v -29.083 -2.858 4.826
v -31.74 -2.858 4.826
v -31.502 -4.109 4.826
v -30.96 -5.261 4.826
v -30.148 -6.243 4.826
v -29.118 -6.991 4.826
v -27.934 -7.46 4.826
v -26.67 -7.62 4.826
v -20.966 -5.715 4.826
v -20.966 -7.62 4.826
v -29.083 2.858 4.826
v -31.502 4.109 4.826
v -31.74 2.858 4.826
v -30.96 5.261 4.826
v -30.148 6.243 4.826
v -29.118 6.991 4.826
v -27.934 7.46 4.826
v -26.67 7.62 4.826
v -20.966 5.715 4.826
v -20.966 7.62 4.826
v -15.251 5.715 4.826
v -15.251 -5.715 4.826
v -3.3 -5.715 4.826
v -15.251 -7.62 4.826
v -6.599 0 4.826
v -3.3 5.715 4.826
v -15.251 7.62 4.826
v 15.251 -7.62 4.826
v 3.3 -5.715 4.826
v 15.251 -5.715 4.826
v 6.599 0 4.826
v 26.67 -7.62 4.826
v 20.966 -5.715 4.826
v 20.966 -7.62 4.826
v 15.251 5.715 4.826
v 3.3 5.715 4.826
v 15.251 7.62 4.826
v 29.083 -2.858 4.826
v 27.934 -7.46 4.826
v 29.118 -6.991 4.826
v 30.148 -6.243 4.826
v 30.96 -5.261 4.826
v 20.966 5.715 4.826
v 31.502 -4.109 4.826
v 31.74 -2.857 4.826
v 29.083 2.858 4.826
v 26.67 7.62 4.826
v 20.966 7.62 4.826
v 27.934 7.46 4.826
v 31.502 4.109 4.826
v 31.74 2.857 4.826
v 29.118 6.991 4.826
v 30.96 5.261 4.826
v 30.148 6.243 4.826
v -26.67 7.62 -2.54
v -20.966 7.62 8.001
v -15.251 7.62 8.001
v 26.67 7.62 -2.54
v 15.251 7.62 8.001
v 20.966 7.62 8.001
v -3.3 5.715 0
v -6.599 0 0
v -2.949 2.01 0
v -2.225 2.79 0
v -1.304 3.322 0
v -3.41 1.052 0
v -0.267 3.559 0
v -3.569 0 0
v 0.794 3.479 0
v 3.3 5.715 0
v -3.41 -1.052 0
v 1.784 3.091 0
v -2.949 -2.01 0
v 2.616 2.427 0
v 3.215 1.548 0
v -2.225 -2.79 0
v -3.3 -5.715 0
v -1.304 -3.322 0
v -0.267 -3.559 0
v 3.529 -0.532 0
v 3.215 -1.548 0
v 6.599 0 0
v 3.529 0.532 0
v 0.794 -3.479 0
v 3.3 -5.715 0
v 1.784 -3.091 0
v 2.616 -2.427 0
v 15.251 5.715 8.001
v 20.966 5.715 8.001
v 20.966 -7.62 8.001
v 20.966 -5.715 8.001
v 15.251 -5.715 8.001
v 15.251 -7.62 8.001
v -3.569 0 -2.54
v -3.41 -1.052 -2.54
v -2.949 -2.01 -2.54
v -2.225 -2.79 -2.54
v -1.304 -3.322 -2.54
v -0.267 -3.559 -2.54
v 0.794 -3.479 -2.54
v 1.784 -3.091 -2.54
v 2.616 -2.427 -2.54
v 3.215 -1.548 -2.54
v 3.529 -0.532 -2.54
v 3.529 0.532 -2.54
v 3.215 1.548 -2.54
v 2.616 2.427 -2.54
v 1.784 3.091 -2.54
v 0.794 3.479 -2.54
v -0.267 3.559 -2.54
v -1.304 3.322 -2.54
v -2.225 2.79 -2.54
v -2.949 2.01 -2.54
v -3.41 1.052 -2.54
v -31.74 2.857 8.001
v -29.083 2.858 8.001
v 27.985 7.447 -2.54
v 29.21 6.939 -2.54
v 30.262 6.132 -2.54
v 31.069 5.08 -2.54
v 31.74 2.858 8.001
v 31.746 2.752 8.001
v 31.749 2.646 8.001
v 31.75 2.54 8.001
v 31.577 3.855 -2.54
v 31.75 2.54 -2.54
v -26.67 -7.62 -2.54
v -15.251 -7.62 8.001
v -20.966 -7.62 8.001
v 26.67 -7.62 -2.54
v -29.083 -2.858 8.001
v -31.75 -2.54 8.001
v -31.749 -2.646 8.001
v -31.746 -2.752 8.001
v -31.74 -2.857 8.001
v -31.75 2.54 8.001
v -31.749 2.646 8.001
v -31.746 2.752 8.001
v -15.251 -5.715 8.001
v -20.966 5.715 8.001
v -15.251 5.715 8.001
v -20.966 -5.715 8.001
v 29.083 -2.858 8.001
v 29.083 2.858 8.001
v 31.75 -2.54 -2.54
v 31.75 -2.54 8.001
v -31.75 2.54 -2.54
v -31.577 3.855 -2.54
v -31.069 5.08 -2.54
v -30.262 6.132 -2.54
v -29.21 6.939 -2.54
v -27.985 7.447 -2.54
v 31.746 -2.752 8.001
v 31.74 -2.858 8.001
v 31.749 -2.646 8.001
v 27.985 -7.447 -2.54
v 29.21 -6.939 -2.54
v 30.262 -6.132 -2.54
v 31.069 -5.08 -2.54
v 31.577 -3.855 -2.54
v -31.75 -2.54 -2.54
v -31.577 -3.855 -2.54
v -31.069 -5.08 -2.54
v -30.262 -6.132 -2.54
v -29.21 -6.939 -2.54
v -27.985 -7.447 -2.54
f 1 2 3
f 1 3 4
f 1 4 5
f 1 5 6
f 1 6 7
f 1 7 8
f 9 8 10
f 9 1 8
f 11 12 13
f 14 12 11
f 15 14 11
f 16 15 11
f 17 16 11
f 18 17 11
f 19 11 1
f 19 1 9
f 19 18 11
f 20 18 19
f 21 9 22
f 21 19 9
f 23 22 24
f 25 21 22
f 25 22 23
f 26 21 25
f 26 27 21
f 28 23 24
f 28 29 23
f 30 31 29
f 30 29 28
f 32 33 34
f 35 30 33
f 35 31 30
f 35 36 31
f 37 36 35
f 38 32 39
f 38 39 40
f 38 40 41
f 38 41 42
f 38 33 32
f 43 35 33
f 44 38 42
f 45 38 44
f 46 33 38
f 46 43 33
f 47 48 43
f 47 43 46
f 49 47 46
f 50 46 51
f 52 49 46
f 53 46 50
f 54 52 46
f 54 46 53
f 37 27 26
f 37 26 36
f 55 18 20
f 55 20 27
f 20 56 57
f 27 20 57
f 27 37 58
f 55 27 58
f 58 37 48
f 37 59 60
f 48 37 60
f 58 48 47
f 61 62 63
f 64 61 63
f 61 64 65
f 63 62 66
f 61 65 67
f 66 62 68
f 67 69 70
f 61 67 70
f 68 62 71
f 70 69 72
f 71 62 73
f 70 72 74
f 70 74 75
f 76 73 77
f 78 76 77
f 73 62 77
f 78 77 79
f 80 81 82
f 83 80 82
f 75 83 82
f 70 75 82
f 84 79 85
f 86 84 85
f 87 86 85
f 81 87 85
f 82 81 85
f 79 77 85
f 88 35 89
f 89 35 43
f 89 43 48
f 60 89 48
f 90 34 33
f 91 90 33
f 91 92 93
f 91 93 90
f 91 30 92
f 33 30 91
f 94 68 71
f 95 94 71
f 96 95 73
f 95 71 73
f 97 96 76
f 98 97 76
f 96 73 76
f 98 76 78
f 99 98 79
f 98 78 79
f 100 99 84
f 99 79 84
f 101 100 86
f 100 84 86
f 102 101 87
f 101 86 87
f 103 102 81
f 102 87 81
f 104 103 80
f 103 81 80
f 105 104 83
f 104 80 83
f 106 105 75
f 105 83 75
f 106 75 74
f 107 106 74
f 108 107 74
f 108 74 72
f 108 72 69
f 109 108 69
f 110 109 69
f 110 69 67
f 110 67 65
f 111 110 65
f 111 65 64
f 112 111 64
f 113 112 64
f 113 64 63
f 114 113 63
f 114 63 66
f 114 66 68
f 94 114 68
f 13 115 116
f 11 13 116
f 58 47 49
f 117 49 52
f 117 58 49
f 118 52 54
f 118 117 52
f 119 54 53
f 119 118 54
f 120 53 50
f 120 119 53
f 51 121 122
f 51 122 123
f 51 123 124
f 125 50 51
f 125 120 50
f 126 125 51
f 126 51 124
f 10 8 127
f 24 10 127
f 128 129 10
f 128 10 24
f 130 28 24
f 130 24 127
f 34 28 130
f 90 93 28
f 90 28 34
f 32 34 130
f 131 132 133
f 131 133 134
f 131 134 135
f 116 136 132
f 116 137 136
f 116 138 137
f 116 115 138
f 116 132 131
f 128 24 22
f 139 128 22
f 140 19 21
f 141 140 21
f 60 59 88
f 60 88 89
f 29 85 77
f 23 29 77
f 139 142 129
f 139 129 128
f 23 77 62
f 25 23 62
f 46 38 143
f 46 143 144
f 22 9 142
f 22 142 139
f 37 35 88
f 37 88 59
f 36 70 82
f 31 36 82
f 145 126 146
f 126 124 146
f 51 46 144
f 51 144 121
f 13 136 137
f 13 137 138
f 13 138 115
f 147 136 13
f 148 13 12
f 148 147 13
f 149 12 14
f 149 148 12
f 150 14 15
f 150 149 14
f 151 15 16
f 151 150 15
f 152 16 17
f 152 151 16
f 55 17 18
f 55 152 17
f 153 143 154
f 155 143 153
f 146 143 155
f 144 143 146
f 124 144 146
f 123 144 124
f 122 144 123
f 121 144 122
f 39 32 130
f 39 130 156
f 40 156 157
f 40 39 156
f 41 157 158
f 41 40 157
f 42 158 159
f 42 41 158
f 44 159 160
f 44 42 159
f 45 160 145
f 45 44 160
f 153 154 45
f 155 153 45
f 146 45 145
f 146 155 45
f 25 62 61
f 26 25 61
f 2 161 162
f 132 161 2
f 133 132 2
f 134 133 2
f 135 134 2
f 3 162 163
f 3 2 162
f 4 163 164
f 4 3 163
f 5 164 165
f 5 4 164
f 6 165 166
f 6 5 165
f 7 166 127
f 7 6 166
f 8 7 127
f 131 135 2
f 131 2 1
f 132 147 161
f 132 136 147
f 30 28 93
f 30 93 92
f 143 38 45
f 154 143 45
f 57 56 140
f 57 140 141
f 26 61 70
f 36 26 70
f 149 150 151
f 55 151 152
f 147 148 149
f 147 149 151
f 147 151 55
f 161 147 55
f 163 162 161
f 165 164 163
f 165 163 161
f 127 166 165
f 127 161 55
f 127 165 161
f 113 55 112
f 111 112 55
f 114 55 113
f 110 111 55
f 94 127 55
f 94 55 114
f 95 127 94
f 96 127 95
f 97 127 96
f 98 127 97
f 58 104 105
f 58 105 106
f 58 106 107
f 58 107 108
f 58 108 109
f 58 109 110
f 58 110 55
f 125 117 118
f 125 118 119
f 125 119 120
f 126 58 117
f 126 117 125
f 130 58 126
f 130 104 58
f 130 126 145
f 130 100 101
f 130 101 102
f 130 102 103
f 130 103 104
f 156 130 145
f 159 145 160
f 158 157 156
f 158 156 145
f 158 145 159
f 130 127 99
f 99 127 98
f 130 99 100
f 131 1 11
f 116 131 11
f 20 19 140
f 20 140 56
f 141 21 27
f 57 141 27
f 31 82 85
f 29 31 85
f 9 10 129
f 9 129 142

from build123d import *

# Parameters (mm, degrees)
F0_W     = 63.5
F0_H     = 15.24
F1_DEPTH = 4.826
F2_W     = 2.667
F2_H     = 5.715
F2_W_2   = 5.715
F2_H_2   = 1.905
F3_DEPTH = 3.175
F4_W     = 63.5
F4_H     = 15.24
F5_DEPTH = 2.54
F7_D     = 7.1374
F8_R     = 5.08


with BuildPart() as f1:
    # F0 (on Top) → F1 (new body)
    with BuildSketch(Plane.XY):
        Rectangle(F0_W, F0_H)
        Polygon((-3.2995567884, -5.715), (-6.5991135768, 0), (-3.2995567884, 5.715), (3.2995567884, 5.715), (6.5991135768, 0), (3.2995567884, -5.715), align=None, mode=Mode.SUBTRACT)
    extrude(amount=F1_DEPTH)

    # F2 (on face) → F3 (join)
    with BuildSketch(Plane.XY.offset(4.826)):
        with Locations((-30.4165, 0)):
            Rectangle(F2_W, F2_H)
        with Locations((-18.1081227605, -6.6675)):
            Rectangle(F2_W_2, F2_H_2)
        with Locations((18.1081227605, -6.6675)):
            Rectangle(F2_W_2, F2_H_2)
        with Locations((-18.1081227605, 6.6675)):
            Rectangle(F2_W_2, F2_H_2)
        with Locations((18.1081227605, 6.6675)):
            Rectangle(F2_W_2, F2_H_2)
        with Locations((30.4165, 0)):
            Rectangle(F2_W, F2_H)
    extrude(amount=F3_DEPTH)

    # F4 (on face) → F5 (join)
    with BuildSketch(Plane(origin=(0, 0, 0), x_dir=(1, 0, 0), z_dir=(0, 0, -1))):
        Rectangle(F4_W, F4_H)
    extrude(amount=F5_DEPTH)

    # F7 (through all)
    with Locations(Plane(origin=(0, 0, -2.54), x_dir=(1, 0, 0), z_dir=(0, 0, -1))):
        with Locations((0, 0)):
            Hole(F7_D / 2)

    # F8
    f8_edges = [f1.edges().sort_by_distance(p)[0] for p in [
        (31.75, -7.62, 1.143),
        (31.75, 7.62, 1.143),
        (-31.75, 7.62, 1.143),
        (-31.75, -7.62, 1.143),
    ]]
    fillet(f8_edges, radius=F8_R)


solid = f1.part
